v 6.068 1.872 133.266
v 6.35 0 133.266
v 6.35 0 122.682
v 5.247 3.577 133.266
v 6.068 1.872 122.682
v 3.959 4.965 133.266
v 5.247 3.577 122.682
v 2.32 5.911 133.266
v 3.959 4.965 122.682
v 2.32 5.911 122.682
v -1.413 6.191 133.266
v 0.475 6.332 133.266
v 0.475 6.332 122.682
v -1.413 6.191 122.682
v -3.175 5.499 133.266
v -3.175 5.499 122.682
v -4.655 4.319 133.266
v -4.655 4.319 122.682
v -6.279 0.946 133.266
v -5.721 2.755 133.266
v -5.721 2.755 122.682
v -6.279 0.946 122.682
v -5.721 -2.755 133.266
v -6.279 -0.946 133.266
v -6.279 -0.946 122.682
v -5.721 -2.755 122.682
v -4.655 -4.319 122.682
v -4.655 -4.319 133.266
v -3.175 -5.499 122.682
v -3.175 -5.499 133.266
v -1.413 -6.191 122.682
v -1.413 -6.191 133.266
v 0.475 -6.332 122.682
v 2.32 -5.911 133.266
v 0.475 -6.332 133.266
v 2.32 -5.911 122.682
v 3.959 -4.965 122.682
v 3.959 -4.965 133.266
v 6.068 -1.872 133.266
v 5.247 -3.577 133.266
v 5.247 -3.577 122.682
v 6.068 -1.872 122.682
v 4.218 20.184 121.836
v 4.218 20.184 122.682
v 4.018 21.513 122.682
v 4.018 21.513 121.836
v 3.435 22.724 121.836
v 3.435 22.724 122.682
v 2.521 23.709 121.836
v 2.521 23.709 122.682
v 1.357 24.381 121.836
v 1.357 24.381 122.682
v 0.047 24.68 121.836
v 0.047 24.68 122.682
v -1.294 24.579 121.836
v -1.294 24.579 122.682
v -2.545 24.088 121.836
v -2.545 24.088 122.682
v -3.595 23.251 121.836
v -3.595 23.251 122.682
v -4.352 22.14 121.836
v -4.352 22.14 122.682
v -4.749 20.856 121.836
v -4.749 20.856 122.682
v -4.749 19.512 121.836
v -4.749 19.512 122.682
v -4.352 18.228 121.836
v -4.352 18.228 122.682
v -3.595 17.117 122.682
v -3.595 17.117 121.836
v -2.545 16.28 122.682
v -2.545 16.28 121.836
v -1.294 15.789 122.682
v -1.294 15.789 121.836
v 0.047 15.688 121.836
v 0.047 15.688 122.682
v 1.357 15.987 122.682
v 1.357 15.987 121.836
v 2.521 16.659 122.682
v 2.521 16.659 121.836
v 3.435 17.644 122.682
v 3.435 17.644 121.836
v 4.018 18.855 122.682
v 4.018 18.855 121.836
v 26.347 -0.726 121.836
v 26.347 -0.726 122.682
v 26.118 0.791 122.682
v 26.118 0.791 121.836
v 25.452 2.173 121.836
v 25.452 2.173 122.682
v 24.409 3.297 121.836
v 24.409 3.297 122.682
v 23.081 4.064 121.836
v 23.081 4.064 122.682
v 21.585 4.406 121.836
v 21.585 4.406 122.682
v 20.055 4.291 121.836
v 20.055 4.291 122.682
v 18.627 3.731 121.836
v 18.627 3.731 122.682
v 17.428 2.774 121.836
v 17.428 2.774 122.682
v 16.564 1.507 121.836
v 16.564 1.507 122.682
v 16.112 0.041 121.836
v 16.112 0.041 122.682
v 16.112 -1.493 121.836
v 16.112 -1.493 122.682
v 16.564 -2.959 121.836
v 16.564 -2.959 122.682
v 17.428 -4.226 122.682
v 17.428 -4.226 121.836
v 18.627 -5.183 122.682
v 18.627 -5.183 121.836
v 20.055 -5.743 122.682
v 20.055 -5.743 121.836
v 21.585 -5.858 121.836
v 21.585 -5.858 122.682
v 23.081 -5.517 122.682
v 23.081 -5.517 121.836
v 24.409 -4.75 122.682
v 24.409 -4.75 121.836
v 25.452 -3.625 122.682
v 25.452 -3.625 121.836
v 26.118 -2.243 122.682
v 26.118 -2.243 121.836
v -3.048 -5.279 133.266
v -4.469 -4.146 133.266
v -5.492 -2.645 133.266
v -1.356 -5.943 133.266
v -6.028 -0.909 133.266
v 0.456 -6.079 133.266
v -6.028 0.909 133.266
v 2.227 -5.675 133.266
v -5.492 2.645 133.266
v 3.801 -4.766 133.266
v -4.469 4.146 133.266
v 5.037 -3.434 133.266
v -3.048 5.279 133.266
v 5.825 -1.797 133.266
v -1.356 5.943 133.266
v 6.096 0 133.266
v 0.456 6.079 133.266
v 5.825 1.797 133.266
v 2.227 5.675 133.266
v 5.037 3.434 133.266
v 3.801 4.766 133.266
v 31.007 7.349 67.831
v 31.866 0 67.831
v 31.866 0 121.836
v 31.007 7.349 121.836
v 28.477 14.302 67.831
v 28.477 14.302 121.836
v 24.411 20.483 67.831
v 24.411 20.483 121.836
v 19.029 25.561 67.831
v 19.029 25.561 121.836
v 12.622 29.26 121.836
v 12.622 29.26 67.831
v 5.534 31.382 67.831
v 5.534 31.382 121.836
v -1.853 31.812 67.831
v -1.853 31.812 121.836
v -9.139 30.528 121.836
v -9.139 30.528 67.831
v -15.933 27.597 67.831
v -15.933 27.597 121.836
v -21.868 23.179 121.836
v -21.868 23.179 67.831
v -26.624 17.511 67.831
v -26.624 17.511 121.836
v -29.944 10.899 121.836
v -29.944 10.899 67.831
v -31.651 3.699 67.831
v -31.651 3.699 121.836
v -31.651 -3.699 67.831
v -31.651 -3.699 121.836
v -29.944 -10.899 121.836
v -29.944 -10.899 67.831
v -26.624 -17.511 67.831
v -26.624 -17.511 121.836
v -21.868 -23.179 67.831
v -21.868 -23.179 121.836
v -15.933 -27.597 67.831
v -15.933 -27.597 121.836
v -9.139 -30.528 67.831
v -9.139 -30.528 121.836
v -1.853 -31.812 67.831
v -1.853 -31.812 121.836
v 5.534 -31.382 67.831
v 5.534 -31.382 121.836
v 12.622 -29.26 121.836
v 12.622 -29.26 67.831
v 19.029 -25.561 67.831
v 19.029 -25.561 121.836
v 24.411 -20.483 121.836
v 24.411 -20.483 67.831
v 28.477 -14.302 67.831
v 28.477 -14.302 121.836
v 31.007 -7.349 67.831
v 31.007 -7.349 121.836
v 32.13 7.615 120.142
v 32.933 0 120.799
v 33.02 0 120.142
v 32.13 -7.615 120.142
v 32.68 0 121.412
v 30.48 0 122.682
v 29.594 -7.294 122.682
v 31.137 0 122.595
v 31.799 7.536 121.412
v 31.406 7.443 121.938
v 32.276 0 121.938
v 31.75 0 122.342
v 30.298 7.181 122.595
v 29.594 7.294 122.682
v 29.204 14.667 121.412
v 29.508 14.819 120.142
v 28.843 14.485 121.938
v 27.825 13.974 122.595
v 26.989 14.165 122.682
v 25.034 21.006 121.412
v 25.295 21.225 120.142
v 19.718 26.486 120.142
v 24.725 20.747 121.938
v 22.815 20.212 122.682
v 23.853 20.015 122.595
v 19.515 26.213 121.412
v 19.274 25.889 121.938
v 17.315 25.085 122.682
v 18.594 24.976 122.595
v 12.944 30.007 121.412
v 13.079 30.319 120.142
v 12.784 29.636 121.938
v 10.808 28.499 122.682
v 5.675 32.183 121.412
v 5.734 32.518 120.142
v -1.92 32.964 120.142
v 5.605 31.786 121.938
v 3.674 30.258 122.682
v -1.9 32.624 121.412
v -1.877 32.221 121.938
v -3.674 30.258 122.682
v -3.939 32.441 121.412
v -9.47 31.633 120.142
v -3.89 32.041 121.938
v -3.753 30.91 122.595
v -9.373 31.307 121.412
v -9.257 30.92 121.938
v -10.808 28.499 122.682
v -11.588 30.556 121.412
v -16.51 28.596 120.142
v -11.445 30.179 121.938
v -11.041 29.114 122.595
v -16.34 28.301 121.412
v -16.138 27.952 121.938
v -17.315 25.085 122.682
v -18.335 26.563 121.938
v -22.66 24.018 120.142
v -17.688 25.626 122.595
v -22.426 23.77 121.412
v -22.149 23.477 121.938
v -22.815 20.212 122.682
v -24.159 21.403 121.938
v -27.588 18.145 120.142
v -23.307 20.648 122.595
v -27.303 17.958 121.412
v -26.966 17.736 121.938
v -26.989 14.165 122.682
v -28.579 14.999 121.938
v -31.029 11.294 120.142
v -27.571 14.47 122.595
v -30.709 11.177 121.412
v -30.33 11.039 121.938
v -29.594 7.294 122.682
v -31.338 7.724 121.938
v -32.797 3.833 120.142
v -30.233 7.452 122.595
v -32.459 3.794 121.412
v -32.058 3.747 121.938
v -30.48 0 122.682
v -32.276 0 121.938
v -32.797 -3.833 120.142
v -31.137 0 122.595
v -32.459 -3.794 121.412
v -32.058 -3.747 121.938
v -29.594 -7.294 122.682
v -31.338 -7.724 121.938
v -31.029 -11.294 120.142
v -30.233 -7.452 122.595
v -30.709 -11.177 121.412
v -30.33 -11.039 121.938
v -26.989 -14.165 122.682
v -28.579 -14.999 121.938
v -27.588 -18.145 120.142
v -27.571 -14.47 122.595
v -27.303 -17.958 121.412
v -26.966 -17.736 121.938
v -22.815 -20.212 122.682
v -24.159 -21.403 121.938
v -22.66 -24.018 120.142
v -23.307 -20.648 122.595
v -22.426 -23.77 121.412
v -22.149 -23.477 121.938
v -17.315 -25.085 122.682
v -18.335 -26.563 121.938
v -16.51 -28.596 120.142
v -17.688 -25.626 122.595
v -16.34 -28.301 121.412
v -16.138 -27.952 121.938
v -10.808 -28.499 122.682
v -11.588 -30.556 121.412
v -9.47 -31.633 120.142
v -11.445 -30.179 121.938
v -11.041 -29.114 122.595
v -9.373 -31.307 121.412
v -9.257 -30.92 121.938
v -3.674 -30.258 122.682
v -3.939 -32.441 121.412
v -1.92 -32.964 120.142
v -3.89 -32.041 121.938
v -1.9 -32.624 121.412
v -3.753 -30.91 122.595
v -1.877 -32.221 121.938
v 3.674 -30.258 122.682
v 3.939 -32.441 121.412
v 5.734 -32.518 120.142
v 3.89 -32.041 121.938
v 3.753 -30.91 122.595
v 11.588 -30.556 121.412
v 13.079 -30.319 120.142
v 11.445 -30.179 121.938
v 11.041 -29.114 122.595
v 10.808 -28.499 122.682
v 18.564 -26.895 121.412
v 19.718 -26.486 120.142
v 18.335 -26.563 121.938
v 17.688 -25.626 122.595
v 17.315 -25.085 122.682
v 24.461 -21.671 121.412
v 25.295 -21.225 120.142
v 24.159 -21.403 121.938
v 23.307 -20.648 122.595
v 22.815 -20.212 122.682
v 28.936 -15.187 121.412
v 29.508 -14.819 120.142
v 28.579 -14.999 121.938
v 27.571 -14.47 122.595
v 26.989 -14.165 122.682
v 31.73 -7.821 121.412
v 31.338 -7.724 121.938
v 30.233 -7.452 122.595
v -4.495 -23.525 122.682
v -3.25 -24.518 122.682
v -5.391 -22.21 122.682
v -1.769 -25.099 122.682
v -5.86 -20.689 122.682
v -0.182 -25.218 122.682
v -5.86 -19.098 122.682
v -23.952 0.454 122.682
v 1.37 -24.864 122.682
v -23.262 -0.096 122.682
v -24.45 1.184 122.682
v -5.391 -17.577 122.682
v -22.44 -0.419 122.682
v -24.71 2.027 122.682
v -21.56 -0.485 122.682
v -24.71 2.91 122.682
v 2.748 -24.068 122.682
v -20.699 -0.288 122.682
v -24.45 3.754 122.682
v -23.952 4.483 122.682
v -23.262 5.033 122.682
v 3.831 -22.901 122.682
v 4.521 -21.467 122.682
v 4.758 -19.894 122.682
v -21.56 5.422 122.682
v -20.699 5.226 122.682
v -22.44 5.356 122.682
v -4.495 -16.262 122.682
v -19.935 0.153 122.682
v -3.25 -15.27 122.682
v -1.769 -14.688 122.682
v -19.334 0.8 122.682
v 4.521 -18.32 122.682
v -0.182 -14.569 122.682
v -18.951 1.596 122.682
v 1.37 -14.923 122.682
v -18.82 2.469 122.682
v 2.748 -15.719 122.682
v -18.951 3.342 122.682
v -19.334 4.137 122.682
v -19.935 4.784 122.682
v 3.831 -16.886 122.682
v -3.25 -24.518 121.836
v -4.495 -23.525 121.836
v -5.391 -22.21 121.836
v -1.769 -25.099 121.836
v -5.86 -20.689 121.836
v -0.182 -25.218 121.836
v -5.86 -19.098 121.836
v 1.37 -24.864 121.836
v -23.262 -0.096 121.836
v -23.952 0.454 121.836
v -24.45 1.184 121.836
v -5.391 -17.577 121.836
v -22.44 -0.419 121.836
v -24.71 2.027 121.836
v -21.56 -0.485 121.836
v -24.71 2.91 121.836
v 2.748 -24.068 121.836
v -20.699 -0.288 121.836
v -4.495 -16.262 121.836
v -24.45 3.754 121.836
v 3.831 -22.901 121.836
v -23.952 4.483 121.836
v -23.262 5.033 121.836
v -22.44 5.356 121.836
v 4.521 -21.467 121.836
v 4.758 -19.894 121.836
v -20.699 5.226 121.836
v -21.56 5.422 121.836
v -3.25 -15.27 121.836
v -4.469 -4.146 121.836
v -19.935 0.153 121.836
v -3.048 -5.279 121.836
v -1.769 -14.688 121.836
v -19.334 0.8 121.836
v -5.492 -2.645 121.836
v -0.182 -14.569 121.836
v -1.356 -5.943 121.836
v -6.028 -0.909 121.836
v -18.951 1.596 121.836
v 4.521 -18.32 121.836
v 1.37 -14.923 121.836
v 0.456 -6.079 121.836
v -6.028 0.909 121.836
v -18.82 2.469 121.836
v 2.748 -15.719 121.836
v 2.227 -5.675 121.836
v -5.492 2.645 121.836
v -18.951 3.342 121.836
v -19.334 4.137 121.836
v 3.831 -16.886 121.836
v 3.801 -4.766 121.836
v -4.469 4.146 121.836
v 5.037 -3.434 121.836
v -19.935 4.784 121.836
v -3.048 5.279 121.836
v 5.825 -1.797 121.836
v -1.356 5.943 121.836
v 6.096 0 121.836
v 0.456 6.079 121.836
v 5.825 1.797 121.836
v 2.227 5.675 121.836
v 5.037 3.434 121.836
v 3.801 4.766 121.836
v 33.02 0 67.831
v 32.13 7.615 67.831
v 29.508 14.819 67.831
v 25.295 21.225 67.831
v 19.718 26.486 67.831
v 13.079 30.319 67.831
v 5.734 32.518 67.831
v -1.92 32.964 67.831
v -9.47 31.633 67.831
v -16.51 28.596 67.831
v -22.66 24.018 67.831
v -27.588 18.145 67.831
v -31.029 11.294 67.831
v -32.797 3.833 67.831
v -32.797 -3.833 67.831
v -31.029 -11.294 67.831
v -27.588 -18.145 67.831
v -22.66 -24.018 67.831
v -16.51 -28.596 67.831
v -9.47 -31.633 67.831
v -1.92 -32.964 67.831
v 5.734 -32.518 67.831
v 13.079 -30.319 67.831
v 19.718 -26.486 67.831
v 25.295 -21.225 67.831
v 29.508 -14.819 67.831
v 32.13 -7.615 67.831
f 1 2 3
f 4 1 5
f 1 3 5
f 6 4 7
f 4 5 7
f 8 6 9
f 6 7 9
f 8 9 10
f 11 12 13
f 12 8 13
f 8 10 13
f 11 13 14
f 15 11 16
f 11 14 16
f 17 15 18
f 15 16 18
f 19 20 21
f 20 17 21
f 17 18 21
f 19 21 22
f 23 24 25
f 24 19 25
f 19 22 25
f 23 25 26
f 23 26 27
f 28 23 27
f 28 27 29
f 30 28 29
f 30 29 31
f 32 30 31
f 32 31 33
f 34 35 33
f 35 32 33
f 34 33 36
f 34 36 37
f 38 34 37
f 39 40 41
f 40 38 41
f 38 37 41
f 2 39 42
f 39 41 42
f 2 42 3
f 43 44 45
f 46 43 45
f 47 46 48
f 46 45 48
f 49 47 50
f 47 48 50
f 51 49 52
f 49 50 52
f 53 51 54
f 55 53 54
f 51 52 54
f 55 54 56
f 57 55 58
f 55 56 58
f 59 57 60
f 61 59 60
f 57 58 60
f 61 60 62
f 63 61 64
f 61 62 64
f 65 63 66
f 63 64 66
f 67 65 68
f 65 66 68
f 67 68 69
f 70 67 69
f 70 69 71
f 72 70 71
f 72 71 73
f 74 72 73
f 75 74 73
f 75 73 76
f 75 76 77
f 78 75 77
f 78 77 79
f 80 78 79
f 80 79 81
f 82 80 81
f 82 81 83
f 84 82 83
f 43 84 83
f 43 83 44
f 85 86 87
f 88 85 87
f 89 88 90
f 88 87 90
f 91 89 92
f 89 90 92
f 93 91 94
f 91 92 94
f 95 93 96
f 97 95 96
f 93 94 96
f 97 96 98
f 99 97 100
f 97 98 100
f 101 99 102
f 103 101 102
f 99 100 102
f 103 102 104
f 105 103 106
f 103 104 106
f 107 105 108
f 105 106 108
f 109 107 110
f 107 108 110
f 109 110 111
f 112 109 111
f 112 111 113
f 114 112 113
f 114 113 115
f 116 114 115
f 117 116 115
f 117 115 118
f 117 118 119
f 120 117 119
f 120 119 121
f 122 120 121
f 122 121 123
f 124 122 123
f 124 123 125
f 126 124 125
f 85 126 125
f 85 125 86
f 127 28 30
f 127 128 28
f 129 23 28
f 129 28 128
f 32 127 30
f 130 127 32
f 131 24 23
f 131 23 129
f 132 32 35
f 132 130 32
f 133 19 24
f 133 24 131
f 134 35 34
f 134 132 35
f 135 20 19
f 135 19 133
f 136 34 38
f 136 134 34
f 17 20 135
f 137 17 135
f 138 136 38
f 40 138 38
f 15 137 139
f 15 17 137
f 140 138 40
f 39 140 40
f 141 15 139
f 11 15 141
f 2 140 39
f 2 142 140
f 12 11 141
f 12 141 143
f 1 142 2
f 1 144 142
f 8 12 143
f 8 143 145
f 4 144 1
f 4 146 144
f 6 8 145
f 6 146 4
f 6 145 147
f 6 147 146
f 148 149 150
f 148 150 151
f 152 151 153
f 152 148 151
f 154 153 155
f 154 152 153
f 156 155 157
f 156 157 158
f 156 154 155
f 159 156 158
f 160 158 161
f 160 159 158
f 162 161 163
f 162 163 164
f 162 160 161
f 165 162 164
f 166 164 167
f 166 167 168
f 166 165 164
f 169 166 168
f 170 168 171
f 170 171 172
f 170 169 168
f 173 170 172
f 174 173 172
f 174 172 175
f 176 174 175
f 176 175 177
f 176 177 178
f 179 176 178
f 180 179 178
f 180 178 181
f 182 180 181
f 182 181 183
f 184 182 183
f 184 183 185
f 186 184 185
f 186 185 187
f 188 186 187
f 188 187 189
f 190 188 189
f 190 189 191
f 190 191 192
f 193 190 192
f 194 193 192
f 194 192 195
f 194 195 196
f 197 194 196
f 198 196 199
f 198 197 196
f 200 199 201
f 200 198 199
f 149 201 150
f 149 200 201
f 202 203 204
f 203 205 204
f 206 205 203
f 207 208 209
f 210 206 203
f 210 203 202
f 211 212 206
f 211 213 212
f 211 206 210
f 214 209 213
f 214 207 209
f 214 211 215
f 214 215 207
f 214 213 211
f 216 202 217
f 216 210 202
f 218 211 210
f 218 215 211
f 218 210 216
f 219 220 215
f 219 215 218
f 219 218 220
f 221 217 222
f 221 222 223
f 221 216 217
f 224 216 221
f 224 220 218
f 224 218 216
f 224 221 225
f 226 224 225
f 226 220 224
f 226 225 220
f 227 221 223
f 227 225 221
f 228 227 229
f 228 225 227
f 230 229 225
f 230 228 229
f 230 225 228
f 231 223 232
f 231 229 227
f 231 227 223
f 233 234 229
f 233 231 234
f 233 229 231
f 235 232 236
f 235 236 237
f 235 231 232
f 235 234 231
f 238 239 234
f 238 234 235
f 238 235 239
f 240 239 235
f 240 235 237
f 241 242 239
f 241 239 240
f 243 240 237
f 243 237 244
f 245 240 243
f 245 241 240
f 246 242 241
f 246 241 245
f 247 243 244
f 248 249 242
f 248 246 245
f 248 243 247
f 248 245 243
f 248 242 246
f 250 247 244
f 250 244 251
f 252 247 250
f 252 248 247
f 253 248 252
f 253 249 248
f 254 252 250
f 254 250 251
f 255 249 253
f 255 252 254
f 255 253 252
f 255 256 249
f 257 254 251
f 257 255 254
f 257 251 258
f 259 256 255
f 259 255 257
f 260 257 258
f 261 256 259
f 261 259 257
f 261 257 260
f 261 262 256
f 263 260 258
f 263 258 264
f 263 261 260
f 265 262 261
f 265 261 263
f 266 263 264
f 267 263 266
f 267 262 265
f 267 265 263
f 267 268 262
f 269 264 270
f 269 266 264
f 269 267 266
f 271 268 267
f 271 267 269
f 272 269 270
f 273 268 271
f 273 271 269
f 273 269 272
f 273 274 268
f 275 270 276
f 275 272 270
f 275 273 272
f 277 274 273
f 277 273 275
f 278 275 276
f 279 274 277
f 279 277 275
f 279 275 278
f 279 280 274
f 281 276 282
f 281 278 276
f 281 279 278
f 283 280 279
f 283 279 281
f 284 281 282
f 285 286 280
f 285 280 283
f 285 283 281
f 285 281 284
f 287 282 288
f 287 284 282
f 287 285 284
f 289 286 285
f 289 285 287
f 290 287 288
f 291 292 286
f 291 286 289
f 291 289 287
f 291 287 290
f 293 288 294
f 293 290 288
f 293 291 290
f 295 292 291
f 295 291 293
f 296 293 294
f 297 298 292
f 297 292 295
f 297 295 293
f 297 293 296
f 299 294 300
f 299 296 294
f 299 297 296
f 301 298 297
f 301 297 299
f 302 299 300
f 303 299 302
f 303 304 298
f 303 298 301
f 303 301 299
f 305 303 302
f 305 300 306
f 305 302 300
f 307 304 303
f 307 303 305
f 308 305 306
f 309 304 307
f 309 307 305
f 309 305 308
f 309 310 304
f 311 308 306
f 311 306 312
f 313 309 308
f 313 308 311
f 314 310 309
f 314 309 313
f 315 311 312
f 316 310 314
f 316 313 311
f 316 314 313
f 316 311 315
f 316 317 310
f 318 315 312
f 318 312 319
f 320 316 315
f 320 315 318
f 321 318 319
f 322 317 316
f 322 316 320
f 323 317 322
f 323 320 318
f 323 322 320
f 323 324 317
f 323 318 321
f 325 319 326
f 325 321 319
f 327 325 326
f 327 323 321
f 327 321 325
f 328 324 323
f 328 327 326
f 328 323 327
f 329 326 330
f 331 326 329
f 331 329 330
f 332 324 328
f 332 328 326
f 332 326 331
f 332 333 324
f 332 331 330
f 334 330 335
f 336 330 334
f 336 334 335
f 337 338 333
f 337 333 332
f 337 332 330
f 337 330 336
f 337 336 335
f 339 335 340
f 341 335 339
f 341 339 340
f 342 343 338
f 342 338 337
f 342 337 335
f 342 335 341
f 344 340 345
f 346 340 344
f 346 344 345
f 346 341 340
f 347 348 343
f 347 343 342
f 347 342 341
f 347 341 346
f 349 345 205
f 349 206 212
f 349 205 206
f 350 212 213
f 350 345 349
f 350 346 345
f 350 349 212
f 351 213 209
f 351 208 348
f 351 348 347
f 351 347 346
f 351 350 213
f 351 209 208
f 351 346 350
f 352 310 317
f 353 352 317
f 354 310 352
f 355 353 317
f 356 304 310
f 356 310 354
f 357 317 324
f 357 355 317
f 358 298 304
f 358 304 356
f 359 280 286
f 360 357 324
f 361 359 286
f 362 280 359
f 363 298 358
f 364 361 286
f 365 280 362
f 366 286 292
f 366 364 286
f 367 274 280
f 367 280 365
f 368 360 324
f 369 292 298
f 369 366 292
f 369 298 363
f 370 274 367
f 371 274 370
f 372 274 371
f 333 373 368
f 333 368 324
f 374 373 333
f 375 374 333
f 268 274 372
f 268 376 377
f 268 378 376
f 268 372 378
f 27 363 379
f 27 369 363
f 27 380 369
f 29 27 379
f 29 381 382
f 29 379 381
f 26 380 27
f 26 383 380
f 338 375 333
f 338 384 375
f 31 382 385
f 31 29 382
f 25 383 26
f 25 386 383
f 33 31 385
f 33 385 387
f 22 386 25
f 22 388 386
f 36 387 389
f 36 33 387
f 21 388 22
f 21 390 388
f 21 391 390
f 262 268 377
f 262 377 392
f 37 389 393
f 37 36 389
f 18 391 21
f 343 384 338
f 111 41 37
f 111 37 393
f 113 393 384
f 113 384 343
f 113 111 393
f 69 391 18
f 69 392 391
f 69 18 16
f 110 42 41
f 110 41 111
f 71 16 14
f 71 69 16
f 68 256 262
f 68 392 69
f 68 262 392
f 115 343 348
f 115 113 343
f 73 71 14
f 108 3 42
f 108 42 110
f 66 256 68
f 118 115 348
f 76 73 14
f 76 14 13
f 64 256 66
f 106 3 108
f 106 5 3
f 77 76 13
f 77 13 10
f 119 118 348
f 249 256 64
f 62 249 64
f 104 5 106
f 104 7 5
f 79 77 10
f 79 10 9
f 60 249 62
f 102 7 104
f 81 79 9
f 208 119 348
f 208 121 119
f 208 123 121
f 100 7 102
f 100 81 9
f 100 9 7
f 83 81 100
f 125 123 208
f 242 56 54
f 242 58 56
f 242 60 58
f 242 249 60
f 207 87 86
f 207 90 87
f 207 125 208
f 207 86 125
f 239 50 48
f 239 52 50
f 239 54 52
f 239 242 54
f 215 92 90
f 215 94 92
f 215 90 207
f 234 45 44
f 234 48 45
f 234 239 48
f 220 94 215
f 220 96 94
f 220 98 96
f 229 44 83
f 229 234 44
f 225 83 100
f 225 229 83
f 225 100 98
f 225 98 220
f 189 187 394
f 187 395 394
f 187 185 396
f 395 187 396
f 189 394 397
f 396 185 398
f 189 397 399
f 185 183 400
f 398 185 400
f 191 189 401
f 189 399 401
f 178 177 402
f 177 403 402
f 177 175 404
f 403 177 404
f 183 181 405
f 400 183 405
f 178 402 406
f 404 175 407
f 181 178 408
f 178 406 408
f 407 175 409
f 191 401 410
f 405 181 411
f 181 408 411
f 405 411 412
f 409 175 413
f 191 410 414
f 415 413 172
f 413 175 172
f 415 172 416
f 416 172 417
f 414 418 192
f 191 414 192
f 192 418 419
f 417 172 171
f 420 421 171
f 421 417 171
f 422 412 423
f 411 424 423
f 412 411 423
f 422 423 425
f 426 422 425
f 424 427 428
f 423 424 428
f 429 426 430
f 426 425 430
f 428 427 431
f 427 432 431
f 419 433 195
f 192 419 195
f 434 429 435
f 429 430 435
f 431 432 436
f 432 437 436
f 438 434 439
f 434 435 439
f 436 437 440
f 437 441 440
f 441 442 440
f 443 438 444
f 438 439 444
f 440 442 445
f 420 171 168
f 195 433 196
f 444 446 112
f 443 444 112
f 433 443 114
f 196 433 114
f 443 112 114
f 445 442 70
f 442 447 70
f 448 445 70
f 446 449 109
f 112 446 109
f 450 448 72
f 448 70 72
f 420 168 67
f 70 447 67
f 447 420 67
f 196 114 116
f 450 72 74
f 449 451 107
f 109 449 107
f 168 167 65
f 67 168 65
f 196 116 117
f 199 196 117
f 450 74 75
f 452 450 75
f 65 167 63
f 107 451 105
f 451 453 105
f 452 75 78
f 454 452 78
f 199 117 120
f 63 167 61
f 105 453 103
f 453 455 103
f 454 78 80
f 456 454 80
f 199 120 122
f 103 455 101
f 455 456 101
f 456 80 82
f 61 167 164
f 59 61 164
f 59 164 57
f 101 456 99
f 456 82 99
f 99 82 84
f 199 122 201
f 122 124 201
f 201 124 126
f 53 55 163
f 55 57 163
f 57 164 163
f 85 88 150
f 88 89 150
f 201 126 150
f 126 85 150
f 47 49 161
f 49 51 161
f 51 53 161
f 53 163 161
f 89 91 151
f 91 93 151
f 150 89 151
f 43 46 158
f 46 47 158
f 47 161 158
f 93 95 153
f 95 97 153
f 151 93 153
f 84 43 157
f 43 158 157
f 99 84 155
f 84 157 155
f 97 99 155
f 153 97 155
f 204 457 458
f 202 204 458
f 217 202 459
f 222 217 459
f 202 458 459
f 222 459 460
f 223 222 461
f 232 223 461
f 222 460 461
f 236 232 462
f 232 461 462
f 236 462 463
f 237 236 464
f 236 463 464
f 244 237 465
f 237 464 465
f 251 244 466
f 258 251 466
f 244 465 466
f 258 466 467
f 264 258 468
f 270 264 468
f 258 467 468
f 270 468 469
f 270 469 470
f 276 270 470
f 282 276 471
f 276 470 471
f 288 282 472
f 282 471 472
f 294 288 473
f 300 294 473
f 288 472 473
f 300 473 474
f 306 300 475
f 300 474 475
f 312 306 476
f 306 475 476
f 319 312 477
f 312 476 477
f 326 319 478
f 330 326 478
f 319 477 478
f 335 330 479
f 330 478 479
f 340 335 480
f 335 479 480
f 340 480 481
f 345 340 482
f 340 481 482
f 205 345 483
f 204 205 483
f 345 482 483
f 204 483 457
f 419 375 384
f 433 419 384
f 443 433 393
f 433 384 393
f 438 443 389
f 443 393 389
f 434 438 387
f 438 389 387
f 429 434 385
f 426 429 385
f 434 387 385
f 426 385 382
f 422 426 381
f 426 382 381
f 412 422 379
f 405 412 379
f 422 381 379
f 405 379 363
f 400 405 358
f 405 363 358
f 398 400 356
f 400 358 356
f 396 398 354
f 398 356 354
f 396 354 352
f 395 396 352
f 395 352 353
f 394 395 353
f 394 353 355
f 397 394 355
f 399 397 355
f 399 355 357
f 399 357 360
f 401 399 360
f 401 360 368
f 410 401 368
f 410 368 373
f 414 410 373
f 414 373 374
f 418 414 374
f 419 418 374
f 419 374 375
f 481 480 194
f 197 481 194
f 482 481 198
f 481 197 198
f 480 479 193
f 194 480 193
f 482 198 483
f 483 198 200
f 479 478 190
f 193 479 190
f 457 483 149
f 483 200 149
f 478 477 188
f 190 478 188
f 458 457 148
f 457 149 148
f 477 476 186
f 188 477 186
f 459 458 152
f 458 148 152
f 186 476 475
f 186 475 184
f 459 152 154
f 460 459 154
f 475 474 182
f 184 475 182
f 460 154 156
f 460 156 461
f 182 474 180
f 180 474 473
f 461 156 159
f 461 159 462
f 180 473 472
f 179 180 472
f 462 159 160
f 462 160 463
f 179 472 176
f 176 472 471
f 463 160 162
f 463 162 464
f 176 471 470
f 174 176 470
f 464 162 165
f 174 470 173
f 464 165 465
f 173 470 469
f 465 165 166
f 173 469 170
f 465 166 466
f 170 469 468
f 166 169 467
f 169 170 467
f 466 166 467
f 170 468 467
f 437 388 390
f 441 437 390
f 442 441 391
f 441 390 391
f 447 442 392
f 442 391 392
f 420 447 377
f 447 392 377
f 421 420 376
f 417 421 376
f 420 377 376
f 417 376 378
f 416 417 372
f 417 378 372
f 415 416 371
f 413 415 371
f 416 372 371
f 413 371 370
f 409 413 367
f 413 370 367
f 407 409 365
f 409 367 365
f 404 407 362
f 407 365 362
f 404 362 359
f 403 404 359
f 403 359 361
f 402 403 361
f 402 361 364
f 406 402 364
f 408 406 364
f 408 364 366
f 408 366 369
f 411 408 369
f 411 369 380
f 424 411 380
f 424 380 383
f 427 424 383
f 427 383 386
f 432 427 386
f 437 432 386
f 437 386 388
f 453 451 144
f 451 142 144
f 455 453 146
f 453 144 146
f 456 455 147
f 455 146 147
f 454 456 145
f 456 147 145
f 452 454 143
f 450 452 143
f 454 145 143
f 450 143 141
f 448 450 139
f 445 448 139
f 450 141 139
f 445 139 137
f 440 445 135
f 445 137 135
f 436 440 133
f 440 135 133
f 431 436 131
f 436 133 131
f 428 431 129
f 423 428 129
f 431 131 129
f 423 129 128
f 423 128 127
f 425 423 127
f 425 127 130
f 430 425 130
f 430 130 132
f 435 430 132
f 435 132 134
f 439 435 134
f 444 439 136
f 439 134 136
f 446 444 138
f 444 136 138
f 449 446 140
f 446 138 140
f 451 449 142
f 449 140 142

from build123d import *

# Parameters (mm, degrees)
F0_R           = 27.051
F2_R           = 33.02
F4_DEPTH       = 112.522
F8_DEPTH       = 25.4
F6_R           = 31.8662185307
F10_R          = 27.1012036097
F12_DEPTH      = 111.67649
F13_R          = 6.35
F13_R_2        = 6.096
F14_DEPTH      = 25.4
F15_DEPTH      = 25.4
F16_W          = 95.3798592091
F16_H          = 79.9988703802
F17_DEPTH      = 50.8
F17_DEPTH_BACK = 50.8
F18_R          = 4.5084907347
F18_R_2        = 5.1462074836
F18_R_3        = 5.3392585876
F18_R_4        = 2.9616888365
F19_DEPTH      = 25.4
F20_R          = 2.54
F21_W          = 29.3621988967
F21_H          = 16.516238451
F22_DEPTH      = 25.4
F22_DEPTH_BACK = 25.4


with BuildPart() as f3:
    # F0 (on Top) → F3 section 0
    with BuildSketch(Plane.XY):
        Circle(F0_R)
    # F2 (on offset) → F3 section 1
    with BuildSketch(Plane.XY.offset(10.16)):
        Circle(F2_R)
    loft()

    # F4 (add): a face of the model
    f4_faces = [f3.faces().sort_by_distance(p)[0] for p in [
        (0, 0, 10.16),
    ]]
    extrude(f4_faces, amount=F4_DEPTH)

    # F7 (on face) → F8 (cut)
    with BuildSketch(Plane(origin=(0, 0, 0), x_dir=(1, 0, 0), z_dir=(0, 0, -1))):
        with BuildLine():
            Line((-9.0020672118, 14.5257171748), (8.9738084456, 14.5257171748))
            ThreePointArc((8.9738084456, 14.5257171748), (-0.0141293831, 22.7222466067), (-9.0020672118, 14.5257171748))
        make_face()
    extrude(amount=-F8_DEPTH, mode=Mode.SUBTRACT)

    # F6 (on offset) → F11 section 0
    with BuildSketch(Plane.XY.offset(10.16)):
        Circle(F6_R)
    # F10 (on offset) → F11 section 1
    with BuildSketch(Plane(origin=(0, 0, 1.016), x_dir=(1, 0, 0), z_dir=(0, 0, -1))):
        Circle(F10_R)
    loft(mode=Mode.SUBTRACT)

    # F6 (on offset) → F12 (cut)
    with BuildSketch(Plane.XY.offset(10.16)):
        Circle(F6_R)
    extrude(amount=F12_DEPTH, mode=Mode.SUBTRACT)

    # F13 (on face) → F14 (join)
    with BuildSketch(Plane.XY.offset(122.682)):
        Circle(F13_R)
        Circle(F13_R_2, mode=Mode.SUBTRACT)
    extrude(amount=F14_DEPTH)

    # F15 (cut): a face of the model
    f15_faces = [f3.faces().sort_by_distance(p)[0] for p in [
        (0, 0, 122.682),
    ]]
    extrude(f15_faces, amount=-F15_DEPTH, mode=Mode.SUBTRACT)

    # F16 (on Right) → F17 (cut, two sides)
    with BuildSketch(Plane.YZ) as f17_sk:
        with Locations((3.9506442845, 27.8317159973)):
            Rectangle(F16_W, F16_H)
    extrude(amount=-F17_DEPTH, mode=Mode.SUBTRACT)
    extrude(f17_sk.sketch, amount=F17_DEPTH_BACK, mode=Mode.SUBTRACT)

    # F18 (on face) → F19 (cut)
    with BuildSketch(Plane.XY.offset(122.682)):
        with Locations((-0.2904168505, 20.1840121299)):
            Circle(F18_R)
        with Locations((21.2004743516, -0.7260435959)):
            Circle(F18_R_2)
        with Locations((-0.5808342248, -19.8935940862)):
            Circle(F18_R_3)
        with Locations((-21.7813067138, 2.4685480166)):
            Circle(F18_R_4)
    extrude(amount=-F19_DEPTH, mode=Mode.SUBTRACT)

    # F20
    f20_edges = [f3.edges().sort_by_distance(p)[0] for p in [
        (-33.02, 0, 122.682),
    ]]
    fillet(f20_edges, radius=F20_R)

    # F21 (on Front) → F22 (cut, two sides)
    with BuildSketch(Plane.XZ) as f22_sk:
        with Locations((0.4587839358, 141.5242999792)):
            Rectangle(F21_W, F21_H)
    extrude(amount=-F22_DEPTH, mode=Mode.SUBTRACT)
    extrude(f22_sk.sketch, amount=F22_DEPTH_BACK, mode=Mode.SUBTRACT)


solid = f3.part
